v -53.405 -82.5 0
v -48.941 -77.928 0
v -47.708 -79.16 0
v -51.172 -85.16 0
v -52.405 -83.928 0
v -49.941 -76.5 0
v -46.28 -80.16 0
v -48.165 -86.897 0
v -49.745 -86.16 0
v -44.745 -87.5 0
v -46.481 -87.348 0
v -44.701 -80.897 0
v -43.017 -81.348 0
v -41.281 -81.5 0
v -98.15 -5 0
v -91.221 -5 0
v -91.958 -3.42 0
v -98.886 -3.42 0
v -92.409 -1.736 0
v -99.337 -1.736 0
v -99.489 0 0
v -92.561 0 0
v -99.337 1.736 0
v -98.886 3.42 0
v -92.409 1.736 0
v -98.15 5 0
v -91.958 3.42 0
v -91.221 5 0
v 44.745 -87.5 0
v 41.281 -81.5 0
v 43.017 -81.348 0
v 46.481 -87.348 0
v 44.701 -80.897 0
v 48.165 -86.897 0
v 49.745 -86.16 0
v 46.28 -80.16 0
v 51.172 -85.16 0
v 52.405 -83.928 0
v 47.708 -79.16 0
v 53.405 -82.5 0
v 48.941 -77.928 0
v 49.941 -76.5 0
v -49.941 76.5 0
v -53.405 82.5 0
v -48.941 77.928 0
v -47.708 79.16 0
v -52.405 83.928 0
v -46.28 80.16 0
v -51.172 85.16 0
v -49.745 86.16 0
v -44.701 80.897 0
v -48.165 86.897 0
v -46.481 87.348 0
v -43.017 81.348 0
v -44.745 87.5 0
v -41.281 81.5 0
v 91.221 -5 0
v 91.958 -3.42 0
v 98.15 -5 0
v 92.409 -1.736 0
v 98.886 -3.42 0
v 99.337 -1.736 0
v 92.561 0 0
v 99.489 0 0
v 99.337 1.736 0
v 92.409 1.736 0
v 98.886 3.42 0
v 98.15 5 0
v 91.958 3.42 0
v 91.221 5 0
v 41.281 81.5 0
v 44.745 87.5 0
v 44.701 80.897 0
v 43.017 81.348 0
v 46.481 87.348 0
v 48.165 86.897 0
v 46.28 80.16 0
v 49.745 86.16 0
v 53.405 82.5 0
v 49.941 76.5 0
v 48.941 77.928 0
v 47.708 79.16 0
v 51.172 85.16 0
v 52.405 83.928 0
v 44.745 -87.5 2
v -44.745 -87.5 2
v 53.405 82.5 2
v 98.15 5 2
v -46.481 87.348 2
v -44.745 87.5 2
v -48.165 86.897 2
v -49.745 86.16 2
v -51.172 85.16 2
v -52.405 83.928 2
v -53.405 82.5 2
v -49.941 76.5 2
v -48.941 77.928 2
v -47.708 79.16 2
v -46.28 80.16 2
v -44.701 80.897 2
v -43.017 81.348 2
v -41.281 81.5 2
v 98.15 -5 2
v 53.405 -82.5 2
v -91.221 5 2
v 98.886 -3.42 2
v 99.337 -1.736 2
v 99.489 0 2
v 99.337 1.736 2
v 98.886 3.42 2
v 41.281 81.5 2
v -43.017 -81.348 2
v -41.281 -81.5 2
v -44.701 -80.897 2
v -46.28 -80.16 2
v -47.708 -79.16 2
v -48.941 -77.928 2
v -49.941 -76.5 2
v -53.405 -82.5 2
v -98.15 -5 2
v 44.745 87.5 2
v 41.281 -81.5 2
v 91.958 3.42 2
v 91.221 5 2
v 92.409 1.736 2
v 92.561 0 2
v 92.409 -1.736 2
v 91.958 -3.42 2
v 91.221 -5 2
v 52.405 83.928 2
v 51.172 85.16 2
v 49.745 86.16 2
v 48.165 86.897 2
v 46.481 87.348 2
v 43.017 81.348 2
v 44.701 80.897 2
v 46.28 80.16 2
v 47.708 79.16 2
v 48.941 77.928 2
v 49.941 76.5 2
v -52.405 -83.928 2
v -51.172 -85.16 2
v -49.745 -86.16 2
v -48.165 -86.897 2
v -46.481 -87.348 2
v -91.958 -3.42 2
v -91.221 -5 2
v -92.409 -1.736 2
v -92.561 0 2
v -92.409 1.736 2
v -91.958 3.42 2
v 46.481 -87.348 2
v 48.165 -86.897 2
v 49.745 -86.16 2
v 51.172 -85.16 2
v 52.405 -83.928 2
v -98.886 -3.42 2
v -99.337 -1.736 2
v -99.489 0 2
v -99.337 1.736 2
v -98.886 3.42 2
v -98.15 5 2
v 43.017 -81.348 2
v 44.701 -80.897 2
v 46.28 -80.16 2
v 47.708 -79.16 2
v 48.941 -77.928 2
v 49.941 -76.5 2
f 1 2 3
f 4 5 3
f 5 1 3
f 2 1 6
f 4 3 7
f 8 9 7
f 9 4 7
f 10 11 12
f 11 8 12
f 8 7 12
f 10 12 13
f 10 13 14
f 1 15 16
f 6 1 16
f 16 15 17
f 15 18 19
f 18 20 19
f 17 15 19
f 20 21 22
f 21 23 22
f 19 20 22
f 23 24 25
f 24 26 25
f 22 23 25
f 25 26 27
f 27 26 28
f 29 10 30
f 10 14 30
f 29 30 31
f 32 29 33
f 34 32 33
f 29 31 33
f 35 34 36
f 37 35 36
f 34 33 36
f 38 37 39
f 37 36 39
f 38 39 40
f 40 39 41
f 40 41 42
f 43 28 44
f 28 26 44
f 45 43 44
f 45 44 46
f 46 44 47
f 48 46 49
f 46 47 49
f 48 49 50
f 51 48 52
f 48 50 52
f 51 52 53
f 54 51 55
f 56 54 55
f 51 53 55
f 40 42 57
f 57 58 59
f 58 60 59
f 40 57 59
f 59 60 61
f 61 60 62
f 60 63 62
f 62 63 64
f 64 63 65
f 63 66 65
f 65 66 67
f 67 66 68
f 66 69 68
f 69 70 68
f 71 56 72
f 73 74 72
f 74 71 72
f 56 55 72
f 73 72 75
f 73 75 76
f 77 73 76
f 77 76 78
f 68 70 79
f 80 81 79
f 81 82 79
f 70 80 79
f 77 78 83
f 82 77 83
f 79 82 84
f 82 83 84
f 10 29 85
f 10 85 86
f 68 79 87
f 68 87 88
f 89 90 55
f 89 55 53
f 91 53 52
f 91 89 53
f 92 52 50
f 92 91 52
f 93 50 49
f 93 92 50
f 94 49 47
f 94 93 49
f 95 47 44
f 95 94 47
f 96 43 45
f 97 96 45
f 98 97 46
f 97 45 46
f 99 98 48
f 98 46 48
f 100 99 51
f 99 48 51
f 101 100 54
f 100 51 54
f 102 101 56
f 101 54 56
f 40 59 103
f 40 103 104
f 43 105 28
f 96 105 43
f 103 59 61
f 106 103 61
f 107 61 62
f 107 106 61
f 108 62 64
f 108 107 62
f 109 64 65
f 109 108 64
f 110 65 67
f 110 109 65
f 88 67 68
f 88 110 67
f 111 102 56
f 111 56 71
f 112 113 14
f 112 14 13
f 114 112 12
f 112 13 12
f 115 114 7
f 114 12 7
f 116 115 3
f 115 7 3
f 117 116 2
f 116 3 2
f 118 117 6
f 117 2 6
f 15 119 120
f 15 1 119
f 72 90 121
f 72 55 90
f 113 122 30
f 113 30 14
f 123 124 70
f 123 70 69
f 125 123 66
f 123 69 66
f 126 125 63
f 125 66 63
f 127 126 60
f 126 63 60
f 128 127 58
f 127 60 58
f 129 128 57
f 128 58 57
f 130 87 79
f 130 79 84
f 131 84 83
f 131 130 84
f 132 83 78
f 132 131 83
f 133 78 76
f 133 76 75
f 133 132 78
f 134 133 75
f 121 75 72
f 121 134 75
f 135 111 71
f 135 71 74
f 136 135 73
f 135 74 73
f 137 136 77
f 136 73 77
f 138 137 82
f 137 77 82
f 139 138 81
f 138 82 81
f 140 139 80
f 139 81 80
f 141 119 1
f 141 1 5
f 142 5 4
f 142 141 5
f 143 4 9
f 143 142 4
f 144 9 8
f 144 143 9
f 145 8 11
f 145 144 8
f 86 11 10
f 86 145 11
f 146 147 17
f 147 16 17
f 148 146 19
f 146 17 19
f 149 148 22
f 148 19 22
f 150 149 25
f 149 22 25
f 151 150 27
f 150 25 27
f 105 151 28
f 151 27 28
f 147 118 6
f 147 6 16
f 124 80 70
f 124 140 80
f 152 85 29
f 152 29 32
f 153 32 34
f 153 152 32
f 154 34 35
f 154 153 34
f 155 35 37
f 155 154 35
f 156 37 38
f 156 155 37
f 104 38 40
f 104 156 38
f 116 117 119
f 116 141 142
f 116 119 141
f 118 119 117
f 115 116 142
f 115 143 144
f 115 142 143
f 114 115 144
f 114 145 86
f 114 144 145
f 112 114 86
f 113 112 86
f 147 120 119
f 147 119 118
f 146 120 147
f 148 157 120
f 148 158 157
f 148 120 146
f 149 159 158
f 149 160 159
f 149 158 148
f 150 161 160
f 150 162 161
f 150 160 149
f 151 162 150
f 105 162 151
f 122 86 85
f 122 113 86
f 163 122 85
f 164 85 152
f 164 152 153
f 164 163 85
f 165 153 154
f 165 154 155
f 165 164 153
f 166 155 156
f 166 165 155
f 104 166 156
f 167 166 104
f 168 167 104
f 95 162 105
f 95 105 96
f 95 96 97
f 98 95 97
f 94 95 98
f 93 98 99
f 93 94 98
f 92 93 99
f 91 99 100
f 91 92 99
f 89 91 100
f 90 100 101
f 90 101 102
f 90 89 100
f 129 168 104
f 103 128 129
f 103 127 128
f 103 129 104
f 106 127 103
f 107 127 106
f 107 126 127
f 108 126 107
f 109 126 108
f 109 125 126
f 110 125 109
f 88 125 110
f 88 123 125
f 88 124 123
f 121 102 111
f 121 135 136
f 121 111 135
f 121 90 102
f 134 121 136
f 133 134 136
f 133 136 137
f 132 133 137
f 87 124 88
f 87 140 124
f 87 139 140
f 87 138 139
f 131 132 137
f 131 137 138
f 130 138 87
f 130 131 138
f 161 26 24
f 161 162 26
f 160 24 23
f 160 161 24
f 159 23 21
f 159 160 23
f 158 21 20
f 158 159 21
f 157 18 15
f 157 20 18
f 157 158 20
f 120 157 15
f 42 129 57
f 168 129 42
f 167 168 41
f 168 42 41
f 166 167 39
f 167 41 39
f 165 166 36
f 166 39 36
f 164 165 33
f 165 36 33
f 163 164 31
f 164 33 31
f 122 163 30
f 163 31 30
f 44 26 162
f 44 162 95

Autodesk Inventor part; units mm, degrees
ref_plane "YZ Plane" through (0, 0, 0) normal (1, 0, 0) x (0, 1, 0)
ref_plane "XZ Plane" through (0, 0, 0) normal (0, 1, 0) x (-1, 0, 0)
ref_plane "XY Plane" through (0, 0, 0) normal (0, 0, 1) x (1, 0, 0)
sketch "Sketch1" plane through (0, 0, 0) normal (0, 0, 1) x (1, 0, 0)
  line L0 (50.5181, -87.5) -> (-50.5181, -87.5)
  line L1 (-50.5181, -87.5) -> (-101.0363, 0)
  line L2 (-101.0363, 0) -> (-50.5181, 87.5)
  line L3 (-50.5181, 87.5) -> (50.5181, 87.5)
  line L4 (50.5181, 87.5) -> (101.0363, 0)
  line L5 (101.0363, 0) -> (50.5181, -87.5)
  point P0 (0, 0)
  point P1 (0, 0)
  dimension "d0" = 175
extrude "Extrusion1" add sketch "Sketch1" along normal blind 2
sketch "Sketch7" plane through (0, 0, 2) normal (0, 0, 1) x (1, 0, 0)
  line L0 (-50.5181, -87.5) -> (50.5181, -87.5) projected
  line L1 (50.5181, -87.5) -> (101.0363, 0) projected
  line L2 (101.0363, 0) -> (50.5181, 87.5) projected
  line L3 (50.5181, 87.5) -> (-50.5181, 87.5) projected
  line L4 (-50.5181, 87.5) -> (-101.0363, 0) projected
  line L5 (-101.0363, 0) -> (-50.5181, -87.5) projected
  line L6 (-47.054, 81.5) -> (47.054, 81.5)
  line L7 (47.054, 81.5) -> (94.1081, 0)
  line L8 (94.1081, 0) -> (47.054, -81.5)
  line L9 (47.054, -81.5) -> (-47.054, -81.5)
  line L10 (-47.054, -81.5) -> (-94.1081, 0)
  line L11 (-94.1081, 0) -> (-47.054, 81.5)
  dimension "d26" = 6
extrude "Extrusion6" cut sketch "Sketch7" against normal blind 7 contours L6 L7 L8 L9 L10 L11
fillet "Fillet2" radius 10 6 edges at (-94.1081, 0, 1) (-47.054, -81.5, 1) (47.054, -81.5, 1) (94.1081, 0, 1) (47.054, 81.5, 1) (-47.054, 81.5, 1)
fillet "Fillet3" radius 10 6 edges at (-50.5181, 87.5, 1) (50.5181, 87.5, 1) (101.0363, 0, 1) (50.5181, -87.5, 1) (-50.5181, -87.5, 1) (-101.0363, 0, 1)
properties part number "Cover v1"
